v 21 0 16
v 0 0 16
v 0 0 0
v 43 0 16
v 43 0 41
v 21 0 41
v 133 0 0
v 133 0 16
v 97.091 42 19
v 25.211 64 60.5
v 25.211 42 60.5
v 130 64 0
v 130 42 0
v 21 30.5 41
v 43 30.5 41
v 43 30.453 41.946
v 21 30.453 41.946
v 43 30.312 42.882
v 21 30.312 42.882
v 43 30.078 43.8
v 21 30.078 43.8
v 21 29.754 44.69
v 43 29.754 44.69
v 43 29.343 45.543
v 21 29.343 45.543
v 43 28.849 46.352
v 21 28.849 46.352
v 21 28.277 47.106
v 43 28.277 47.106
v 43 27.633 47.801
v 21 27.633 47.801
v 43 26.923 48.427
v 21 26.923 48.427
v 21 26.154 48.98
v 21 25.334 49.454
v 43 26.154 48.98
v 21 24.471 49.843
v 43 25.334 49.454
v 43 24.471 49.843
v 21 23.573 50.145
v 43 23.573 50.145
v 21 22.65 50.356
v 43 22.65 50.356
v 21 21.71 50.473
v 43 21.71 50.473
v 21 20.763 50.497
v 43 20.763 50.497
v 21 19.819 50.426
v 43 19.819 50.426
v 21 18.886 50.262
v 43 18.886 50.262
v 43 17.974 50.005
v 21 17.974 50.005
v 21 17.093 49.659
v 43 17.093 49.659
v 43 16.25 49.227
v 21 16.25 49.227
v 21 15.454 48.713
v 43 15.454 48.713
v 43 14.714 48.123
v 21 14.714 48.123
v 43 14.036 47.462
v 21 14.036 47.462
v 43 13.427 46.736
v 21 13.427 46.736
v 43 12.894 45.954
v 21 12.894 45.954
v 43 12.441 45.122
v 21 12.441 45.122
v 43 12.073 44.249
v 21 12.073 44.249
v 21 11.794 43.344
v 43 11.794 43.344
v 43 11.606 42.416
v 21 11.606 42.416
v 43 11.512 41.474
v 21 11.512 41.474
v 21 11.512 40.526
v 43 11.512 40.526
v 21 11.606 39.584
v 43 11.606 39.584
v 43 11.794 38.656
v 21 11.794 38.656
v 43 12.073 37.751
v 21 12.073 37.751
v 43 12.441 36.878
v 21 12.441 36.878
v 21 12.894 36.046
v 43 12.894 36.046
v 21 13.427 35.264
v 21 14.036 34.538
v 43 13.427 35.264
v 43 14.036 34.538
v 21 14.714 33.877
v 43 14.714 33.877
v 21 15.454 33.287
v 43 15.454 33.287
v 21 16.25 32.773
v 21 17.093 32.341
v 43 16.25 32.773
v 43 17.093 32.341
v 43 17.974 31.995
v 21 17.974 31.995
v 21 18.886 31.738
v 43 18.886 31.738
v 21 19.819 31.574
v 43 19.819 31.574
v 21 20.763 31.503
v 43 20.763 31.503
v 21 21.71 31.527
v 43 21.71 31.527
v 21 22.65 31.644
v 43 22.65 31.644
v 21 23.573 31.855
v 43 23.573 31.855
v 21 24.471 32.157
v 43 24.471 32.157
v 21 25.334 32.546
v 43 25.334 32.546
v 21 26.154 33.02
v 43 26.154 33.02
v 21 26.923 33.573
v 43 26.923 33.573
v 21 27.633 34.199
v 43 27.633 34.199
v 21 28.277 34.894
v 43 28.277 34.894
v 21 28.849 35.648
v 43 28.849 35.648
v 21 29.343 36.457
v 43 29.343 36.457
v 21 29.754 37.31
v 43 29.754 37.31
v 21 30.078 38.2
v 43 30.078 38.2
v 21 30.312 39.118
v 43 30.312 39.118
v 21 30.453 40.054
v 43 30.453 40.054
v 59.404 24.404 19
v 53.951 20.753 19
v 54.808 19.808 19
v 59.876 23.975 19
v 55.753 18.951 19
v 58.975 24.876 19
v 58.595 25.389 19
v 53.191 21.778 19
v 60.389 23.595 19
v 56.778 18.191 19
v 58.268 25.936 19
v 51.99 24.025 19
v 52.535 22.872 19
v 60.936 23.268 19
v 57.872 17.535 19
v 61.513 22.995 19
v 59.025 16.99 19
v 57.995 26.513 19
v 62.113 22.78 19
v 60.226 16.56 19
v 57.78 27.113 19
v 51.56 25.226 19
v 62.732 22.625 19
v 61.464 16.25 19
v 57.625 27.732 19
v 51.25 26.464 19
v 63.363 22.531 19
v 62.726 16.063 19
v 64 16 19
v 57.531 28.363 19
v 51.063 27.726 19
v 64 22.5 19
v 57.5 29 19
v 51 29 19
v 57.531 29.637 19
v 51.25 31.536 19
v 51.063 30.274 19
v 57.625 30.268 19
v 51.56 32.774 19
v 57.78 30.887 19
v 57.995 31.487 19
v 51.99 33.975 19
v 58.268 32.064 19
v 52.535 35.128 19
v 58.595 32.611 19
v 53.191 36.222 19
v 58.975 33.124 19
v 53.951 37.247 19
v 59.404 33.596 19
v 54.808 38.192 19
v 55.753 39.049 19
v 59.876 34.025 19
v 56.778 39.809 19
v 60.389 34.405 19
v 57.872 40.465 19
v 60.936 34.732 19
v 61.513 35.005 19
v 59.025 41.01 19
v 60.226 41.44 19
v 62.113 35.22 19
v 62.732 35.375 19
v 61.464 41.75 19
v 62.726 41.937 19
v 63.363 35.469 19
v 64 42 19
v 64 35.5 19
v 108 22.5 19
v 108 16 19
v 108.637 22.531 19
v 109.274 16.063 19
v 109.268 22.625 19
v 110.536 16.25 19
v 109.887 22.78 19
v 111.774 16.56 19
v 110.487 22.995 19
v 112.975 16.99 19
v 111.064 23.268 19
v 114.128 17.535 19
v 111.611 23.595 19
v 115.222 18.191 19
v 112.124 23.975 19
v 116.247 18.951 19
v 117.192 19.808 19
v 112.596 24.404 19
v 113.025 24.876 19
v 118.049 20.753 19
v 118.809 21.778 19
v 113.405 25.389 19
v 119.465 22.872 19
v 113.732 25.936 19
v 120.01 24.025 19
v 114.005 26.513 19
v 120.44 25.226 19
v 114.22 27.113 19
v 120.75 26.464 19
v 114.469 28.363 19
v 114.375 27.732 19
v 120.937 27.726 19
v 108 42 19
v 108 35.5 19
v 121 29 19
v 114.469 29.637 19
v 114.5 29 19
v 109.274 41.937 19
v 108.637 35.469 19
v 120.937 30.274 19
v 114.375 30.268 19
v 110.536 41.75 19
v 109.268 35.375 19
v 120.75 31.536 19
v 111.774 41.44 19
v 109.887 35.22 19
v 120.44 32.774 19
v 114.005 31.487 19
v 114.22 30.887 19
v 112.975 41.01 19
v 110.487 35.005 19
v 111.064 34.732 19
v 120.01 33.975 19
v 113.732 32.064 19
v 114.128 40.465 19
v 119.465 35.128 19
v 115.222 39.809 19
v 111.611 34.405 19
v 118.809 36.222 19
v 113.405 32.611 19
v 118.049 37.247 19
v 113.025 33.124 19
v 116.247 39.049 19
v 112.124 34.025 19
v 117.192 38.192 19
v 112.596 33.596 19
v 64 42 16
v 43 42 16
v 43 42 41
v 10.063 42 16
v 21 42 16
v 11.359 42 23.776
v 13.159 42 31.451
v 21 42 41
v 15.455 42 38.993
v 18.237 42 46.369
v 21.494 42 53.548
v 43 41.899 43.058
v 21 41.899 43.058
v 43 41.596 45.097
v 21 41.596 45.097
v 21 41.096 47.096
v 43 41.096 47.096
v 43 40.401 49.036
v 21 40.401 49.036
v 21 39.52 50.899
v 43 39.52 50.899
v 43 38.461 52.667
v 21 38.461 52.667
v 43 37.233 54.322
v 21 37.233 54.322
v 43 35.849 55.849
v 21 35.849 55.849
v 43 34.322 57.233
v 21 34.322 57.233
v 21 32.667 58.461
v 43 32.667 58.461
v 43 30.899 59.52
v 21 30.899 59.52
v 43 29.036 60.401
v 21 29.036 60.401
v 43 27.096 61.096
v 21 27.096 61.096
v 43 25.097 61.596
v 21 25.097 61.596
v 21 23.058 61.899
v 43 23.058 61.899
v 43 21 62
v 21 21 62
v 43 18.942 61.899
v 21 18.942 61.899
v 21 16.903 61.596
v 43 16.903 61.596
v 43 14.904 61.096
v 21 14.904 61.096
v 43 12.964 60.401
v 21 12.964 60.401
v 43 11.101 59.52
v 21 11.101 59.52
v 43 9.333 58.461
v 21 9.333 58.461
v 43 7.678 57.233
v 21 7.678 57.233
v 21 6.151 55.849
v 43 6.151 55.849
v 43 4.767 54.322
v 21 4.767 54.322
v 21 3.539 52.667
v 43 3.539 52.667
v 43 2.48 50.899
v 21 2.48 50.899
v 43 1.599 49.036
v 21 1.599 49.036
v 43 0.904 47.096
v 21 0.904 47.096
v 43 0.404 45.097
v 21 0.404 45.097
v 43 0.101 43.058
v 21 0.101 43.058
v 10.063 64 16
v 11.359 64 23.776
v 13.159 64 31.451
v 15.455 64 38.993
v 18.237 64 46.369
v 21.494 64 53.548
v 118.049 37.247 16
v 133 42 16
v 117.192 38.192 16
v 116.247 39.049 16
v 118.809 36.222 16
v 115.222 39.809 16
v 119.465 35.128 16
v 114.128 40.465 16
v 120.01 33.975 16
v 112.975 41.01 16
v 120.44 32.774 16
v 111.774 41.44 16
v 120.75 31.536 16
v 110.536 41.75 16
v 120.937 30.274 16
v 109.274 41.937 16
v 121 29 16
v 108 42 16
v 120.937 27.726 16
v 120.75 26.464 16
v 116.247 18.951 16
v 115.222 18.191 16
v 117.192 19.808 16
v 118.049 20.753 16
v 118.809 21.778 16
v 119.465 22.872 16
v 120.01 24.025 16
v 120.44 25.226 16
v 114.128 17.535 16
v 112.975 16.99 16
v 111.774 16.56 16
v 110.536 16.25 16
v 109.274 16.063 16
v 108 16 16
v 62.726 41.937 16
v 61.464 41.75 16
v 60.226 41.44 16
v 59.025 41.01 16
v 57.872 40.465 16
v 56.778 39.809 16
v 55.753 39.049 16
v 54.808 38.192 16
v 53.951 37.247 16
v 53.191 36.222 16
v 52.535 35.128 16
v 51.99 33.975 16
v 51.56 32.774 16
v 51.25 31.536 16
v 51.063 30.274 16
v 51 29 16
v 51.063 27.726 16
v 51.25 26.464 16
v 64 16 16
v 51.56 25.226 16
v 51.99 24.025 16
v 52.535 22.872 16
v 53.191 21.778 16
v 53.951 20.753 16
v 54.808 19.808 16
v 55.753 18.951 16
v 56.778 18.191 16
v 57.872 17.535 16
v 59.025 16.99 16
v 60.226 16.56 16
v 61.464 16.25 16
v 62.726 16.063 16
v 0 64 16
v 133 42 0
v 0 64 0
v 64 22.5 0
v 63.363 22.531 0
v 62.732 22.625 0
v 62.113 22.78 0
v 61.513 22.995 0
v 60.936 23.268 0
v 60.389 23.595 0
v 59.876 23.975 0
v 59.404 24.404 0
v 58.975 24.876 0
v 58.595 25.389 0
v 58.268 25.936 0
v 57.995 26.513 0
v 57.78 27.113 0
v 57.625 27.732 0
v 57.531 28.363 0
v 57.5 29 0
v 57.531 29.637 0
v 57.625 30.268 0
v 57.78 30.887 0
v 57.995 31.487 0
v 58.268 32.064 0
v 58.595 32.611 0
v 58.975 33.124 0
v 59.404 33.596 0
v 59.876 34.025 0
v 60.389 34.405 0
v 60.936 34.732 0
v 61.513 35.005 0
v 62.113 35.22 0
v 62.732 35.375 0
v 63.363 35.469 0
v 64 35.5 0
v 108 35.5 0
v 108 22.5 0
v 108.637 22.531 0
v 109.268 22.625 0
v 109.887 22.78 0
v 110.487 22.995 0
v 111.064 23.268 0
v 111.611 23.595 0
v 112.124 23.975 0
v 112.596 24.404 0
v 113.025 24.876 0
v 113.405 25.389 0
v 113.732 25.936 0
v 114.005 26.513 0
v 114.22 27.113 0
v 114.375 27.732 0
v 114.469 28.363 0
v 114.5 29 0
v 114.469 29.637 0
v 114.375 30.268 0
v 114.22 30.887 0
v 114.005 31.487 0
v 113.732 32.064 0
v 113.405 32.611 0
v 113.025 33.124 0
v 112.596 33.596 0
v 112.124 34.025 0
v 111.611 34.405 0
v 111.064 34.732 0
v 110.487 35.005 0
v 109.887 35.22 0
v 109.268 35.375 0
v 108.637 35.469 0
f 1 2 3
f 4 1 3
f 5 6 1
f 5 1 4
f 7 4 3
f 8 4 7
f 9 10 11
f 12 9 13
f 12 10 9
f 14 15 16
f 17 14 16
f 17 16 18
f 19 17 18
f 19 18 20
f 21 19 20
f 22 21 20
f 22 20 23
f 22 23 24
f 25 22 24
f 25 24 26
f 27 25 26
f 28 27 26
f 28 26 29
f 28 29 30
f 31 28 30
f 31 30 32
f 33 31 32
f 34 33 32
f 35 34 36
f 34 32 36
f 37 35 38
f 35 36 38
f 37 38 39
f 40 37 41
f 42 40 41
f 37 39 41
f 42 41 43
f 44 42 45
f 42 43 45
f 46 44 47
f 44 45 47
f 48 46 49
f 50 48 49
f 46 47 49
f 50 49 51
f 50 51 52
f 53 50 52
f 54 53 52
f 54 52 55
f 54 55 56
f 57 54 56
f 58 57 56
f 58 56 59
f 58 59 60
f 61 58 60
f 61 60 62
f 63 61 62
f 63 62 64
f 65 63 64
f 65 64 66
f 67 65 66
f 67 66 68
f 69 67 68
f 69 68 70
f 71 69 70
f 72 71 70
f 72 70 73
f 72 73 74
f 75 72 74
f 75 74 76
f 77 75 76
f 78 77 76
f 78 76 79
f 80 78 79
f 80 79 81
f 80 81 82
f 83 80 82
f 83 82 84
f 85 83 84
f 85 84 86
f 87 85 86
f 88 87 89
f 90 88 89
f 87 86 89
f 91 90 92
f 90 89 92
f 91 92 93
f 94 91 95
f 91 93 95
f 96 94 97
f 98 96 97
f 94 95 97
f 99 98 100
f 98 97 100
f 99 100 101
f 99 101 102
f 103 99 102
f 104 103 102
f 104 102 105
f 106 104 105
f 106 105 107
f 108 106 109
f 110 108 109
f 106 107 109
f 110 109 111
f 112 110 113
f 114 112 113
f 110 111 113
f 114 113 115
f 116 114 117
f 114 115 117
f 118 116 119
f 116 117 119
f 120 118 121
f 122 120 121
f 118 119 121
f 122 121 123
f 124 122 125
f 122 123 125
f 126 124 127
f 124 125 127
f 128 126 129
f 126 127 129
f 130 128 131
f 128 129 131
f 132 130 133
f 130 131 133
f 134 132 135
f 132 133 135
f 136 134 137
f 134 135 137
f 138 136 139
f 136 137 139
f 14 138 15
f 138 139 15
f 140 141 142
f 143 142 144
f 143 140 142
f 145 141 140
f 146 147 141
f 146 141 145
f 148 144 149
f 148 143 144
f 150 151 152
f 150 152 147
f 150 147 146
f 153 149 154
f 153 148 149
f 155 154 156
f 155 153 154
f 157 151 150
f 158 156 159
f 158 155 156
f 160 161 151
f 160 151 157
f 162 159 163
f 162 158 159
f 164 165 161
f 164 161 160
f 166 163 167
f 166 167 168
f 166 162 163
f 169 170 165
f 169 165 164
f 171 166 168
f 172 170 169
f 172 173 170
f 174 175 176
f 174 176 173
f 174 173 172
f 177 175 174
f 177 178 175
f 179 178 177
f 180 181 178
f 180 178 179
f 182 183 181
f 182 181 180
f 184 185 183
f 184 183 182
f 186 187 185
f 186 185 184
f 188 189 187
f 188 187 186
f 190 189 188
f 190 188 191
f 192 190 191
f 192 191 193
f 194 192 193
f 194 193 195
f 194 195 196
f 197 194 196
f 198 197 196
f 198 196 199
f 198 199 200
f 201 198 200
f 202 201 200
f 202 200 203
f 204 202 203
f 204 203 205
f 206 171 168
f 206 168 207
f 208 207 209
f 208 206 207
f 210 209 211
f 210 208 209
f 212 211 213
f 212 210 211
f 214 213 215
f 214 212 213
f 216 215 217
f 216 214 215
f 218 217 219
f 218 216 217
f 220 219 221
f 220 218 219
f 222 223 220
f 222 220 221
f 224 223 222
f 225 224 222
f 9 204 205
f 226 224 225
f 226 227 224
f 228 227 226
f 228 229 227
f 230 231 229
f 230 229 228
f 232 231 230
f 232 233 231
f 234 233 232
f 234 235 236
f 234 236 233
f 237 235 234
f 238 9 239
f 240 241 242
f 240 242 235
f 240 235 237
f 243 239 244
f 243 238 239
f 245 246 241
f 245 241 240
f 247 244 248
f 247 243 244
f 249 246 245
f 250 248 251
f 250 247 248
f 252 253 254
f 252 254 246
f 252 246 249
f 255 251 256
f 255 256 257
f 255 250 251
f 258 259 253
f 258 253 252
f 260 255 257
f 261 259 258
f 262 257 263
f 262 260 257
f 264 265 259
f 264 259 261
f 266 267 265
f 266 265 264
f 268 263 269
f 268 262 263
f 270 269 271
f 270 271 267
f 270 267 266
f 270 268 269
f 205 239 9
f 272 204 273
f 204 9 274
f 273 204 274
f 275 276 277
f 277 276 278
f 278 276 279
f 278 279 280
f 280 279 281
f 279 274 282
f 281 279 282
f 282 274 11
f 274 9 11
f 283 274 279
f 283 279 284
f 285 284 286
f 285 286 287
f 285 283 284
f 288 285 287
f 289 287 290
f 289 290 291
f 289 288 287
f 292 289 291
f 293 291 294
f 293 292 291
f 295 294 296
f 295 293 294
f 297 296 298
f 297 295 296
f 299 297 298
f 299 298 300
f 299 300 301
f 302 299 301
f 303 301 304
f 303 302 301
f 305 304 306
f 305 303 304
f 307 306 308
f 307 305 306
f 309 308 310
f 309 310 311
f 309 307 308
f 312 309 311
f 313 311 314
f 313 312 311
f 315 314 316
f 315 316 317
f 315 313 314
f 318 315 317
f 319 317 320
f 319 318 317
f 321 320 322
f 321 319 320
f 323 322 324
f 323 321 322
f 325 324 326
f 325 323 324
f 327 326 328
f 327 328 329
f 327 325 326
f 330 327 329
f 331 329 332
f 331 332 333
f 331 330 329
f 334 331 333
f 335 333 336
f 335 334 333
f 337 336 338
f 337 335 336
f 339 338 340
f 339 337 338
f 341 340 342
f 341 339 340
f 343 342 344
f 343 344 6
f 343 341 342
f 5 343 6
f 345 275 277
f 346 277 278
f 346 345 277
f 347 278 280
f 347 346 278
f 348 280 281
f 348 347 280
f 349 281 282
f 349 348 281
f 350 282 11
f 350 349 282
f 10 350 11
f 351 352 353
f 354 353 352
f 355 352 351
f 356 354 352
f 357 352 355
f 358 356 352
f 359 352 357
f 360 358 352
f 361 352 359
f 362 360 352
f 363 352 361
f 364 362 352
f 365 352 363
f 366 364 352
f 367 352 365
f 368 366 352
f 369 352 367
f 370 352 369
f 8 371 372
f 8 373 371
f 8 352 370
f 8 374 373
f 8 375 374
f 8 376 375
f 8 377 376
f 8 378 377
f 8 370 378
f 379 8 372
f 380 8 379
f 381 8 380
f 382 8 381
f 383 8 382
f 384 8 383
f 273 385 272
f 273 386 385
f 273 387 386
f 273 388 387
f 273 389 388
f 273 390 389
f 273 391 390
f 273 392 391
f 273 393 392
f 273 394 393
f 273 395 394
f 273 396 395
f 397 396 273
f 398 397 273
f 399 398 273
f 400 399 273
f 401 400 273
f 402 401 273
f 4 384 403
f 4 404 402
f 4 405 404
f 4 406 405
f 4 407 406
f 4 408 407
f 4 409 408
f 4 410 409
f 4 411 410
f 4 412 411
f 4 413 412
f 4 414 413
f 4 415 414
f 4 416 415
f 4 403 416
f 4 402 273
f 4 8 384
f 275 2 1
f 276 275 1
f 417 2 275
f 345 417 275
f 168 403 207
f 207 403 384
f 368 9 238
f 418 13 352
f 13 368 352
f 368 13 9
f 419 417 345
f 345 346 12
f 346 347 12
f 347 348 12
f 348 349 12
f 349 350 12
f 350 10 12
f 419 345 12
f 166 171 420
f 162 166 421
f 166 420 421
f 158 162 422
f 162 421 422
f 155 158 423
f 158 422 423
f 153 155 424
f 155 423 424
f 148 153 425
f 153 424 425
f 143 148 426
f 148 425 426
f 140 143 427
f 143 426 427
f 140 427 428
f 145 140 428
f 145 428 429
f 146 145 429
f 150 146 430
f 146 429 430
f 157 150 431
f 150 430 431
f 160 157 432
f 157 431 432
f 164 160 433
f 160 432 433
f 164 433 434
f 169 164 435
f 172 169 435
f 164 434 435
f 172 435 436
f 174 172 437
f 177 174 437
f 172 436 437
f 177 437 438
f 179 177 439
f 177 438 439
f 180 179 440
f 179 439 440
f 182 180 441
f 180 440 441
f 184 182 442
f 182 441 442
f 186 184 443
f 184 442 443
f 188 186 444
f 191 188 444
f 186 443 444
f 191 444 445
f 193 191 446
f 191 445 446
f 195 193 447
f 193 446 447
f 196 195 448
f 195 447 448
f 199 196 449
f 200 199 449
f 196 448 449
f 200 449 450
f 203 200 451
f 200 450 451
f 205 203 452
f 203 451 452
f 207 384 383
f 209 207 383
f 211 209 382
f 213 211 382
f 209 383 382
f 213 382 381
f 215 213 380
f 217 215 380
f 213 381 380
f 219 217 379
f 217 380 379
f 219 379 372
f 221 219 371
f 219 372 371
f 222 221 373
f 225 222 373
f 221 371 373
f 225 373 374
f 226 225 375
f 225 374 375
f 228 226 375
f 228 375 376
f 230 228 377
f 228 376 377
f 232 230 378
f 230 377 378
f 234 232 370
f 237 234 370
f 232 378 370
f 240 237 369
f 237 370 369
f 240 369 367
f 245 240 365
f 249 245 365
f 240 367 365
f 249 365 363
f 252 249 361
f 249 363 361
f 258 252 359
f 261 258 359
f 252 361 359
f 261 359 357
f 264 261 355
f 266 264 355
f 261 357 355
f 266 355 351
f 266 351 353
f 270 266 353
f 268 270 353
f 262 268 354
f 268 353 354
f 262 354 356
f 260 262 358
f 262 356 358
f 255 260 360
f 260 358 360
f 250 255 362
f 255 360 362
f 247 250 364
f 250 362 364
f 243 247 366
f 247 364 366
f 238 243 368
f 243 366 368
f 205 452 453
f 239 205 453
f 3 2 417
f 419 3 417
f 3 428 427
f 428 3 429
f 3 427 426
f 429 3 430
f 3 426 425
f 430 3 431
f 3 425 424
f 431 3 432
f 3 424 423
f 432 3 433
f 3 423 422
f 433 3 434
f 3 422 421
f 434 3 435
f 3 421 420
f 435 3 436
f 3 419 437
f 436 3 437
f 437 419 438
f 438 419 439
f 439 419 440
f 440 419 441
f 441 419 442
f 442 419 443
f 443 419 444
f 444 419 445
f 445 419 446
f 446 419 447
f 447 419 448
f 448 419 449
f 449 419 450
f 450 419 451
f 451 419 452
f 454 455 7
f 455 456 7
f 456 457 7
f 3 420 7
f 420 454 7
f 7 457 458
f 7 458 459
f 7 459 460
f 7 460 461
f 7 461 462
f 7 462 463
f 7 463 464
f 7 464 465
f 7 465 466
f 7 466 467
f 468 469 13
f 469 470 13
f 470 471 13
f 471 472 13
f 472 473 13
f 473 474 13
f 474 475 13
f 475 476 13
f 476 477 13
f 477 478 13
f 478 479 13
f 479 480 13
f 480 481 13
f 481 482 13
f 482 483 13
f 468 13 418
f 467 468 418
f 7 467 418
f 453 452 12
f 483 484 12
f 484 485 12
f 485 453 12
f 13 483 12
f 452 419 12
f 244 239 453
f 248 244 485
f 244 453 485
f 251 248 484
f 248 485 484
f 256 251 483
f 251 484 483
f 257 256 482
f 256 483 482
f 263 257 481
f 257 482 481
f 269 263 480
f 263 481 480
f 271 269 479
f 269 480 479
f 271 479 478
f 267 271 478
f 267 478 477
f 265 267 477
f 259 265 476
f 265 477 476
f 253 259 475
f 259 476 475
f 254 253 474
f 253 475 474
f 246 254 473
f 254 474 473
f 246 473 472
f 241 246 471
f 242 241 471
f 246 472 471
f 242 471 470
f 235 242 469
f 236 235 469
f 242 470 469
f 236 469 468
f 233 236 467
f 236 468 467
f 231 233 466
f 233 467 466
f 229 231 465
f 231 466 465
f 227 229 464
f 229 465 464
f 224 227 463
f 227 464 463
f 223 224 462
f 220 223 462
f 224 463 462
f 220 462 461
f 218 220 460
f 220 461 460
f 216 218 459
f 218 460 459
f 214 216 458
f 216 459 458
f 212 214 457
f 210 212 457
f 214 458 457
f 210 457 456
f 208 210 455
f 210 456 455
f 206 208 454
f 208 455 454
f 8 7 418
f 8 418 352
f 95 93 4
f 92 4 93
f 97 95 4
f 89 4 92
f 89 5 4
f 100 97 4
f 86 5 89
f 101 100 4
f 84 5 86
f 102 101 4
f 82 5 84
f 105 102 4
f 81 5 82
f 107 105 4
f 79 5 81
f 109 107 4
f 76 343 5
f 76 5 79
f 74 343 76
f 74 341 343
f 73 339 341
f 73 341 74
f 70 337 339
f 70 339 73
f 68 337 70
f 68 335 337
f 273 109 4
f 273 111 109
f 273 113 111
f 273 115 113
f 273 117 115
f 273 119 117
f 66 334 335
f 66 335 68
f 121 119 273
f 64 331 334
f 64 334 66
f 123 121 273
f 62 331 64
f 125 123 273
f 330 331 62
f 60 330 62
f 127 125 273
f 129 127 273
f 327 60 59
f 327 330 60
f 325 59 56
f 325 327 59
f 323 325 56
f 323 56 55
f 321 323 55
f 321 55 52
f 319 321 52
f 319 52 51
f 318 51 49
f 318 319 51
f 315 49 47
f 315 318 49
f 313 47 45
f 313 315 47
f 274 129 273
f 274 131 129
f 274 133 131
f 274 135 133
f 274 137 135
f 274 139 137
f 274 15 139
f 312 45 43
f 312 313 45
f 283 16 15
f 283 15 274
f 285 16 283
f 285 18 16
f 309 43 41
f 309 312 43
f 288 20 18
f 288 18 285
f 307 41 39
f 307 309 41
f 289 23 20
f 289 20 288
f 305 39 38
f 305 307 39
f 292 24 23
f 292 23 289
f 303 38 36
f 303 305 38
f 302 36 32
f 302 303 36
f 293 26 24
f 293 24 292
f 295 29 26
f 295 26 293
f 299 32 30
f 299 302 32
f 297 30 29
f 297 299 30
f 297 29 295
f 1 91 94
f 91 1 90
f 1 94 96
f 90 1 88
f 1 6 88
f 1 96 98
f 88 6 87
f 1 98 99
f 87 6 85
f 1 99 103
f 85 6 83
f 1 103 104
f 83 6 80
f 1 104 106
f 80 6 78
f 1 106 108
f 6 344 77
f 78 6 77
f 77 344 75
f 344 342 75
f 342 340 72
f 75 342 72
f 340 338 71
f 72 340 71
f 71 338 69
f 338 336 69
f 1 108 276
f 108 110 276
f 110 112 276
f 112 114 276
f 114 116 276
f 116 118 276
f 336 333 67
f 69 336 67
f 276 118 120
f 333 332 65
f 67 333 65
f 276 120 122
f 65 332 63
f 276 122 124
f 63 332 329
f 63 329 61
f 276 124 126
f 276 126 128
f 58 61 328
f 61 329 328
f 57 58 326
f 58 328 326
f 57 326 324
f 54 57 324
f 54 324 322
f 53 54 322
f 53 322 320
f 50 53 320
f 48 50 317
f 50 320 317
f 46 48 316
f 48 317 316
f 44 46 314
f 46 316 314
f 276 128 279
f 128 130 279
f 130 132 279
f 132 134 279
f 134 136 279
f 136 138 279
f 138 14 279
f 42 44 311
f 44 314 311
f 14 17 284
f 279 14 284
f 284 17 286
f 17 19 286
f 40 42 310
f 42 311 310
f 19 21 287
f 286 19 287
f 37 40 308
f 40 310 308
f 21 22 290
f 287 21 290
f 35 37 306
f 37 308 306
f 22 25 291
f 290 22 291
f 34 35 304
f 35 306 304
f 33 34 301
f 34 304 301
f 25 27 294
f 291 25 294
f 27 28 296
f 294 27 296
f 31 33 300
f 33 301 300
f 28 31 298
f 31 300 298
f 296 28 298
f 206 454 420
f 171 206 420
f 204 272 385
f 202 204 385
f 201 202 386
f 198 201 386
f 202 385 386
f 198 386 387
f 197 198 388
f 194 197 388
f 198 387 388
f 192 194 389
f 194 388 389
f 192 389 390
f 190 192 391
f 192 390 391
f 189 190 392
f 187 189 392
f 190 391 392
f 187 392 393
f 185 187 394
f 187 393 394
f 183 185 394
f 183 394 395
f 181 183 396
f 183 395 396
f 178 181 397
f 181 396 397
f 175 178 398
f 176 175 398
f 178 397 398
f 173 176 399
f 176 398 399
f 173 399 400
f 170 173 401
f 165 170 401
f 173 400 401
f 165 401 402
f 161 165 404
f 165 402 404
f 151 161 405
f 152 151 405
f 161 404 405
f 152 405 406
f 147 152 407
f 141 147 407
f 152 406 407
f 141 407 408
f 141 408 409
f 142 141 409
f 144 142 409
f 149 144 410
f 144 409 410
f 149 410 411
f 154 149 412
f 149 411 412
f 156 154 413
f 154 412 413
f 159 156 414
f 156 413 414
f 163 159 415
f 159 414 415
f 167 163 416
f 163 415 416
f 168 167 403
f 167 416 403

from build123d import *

# Parameters (mm, degrees)
F1_DEPTH  = 42
F2_W      = 121
F2_H      = 22
F3_ANGLE  = 30
F5_DEPTH  = 22
F8_DEPTH  = 3
F9_DEPTH  = 25
F6_R      = 9.5
F10_DEPTH = 25
F11_W     = 10.0625162845
F11_H     = 22
F12_DEPTH = 16


with BuildPart() as f1:
    # F0 (on Front) → F1 (new body)
    with BuildSketch(Plane.XZ):
        Polygon((0, 16), (0, 0), (133, 0), (133, 16), (43, 16), (43, 41), (21, 41), (21, 16), align=None)
    extrude(amount=-F1_DEPTH)

    # F2 (on Top) → F3 (revolve)
    with BuildSketch(Plane.XY):
        with Locations((69.5, 53)):
            Rectangle(F2_W, F2_H)
    revolve(axis=Axis((130, 53, 0), (0, 1, 0)), revolution_arc=F3_ANGLE)

    # F4 (on face) → F5 (join)
    with BuildSketch(Plane.YZ.offset(43)):
        with BuildLine():
            Line((0, 41), (42, 41))
            ThreePointArc((42, 41), (21, 62), (0, 41))
        make_face()
    extrude(amount=-F5_DEPTH)

    # F7 (on face) → F8 (join)
    with BuildSketch(Plane.XY.offset(16)):
        with BuildLine():
            Line((102.2871870789, 42), (64, 42))
            ThreePointArc((64, 42), (51, 29), (64, 16))
            Line((64, 16), (108, 16))
            ThreePointArc((108, 16), (121, 29), (108, 42))
            Line((108, 42), (102.2871870789, 42))
        make_face()
        with BuildLine():
            ThreePointArc((64, 22.5), (57.5, 29), (64, 35.5))
            Line((64, 35.5), (108, 35.5))
            ThreePointArc((108, 35.5), (114.5, 29), (108, 22.5))
            Line((108, 22.5), (64, 22.5))
        make_face(mode=Mode.SUBTRACT)
    extrude(amount=F8_DEPTH)

    # F9 (cut): a face of the model
    f9_faces = [f1.faces().sort_by_distance(p)[0] for p in [
        (86, 29, 16),
    ]]
    extrude(f9_faces, amount=-F9_DEPTH, mode=Mode.SUBTRACT)

    # F6 (on face) → F10 (cut)
    with BuildSketch(Plane.YZ.offset(43)):
        with Locations((21, 41)):
            Circle(F6_R)
    extrude(amount=-F10_DEPTH, mode=Mode.SUBTRACT)

    # F11 (on face) → F12 (join)
    with BuildSketch(Plane.XY.offset(16)):
        with Locations((5.0312581423, 53)):
            Rectangle(F11_W, F11_H)
    extrude(amount=-F12_DEPTH)


solid = f1.part
